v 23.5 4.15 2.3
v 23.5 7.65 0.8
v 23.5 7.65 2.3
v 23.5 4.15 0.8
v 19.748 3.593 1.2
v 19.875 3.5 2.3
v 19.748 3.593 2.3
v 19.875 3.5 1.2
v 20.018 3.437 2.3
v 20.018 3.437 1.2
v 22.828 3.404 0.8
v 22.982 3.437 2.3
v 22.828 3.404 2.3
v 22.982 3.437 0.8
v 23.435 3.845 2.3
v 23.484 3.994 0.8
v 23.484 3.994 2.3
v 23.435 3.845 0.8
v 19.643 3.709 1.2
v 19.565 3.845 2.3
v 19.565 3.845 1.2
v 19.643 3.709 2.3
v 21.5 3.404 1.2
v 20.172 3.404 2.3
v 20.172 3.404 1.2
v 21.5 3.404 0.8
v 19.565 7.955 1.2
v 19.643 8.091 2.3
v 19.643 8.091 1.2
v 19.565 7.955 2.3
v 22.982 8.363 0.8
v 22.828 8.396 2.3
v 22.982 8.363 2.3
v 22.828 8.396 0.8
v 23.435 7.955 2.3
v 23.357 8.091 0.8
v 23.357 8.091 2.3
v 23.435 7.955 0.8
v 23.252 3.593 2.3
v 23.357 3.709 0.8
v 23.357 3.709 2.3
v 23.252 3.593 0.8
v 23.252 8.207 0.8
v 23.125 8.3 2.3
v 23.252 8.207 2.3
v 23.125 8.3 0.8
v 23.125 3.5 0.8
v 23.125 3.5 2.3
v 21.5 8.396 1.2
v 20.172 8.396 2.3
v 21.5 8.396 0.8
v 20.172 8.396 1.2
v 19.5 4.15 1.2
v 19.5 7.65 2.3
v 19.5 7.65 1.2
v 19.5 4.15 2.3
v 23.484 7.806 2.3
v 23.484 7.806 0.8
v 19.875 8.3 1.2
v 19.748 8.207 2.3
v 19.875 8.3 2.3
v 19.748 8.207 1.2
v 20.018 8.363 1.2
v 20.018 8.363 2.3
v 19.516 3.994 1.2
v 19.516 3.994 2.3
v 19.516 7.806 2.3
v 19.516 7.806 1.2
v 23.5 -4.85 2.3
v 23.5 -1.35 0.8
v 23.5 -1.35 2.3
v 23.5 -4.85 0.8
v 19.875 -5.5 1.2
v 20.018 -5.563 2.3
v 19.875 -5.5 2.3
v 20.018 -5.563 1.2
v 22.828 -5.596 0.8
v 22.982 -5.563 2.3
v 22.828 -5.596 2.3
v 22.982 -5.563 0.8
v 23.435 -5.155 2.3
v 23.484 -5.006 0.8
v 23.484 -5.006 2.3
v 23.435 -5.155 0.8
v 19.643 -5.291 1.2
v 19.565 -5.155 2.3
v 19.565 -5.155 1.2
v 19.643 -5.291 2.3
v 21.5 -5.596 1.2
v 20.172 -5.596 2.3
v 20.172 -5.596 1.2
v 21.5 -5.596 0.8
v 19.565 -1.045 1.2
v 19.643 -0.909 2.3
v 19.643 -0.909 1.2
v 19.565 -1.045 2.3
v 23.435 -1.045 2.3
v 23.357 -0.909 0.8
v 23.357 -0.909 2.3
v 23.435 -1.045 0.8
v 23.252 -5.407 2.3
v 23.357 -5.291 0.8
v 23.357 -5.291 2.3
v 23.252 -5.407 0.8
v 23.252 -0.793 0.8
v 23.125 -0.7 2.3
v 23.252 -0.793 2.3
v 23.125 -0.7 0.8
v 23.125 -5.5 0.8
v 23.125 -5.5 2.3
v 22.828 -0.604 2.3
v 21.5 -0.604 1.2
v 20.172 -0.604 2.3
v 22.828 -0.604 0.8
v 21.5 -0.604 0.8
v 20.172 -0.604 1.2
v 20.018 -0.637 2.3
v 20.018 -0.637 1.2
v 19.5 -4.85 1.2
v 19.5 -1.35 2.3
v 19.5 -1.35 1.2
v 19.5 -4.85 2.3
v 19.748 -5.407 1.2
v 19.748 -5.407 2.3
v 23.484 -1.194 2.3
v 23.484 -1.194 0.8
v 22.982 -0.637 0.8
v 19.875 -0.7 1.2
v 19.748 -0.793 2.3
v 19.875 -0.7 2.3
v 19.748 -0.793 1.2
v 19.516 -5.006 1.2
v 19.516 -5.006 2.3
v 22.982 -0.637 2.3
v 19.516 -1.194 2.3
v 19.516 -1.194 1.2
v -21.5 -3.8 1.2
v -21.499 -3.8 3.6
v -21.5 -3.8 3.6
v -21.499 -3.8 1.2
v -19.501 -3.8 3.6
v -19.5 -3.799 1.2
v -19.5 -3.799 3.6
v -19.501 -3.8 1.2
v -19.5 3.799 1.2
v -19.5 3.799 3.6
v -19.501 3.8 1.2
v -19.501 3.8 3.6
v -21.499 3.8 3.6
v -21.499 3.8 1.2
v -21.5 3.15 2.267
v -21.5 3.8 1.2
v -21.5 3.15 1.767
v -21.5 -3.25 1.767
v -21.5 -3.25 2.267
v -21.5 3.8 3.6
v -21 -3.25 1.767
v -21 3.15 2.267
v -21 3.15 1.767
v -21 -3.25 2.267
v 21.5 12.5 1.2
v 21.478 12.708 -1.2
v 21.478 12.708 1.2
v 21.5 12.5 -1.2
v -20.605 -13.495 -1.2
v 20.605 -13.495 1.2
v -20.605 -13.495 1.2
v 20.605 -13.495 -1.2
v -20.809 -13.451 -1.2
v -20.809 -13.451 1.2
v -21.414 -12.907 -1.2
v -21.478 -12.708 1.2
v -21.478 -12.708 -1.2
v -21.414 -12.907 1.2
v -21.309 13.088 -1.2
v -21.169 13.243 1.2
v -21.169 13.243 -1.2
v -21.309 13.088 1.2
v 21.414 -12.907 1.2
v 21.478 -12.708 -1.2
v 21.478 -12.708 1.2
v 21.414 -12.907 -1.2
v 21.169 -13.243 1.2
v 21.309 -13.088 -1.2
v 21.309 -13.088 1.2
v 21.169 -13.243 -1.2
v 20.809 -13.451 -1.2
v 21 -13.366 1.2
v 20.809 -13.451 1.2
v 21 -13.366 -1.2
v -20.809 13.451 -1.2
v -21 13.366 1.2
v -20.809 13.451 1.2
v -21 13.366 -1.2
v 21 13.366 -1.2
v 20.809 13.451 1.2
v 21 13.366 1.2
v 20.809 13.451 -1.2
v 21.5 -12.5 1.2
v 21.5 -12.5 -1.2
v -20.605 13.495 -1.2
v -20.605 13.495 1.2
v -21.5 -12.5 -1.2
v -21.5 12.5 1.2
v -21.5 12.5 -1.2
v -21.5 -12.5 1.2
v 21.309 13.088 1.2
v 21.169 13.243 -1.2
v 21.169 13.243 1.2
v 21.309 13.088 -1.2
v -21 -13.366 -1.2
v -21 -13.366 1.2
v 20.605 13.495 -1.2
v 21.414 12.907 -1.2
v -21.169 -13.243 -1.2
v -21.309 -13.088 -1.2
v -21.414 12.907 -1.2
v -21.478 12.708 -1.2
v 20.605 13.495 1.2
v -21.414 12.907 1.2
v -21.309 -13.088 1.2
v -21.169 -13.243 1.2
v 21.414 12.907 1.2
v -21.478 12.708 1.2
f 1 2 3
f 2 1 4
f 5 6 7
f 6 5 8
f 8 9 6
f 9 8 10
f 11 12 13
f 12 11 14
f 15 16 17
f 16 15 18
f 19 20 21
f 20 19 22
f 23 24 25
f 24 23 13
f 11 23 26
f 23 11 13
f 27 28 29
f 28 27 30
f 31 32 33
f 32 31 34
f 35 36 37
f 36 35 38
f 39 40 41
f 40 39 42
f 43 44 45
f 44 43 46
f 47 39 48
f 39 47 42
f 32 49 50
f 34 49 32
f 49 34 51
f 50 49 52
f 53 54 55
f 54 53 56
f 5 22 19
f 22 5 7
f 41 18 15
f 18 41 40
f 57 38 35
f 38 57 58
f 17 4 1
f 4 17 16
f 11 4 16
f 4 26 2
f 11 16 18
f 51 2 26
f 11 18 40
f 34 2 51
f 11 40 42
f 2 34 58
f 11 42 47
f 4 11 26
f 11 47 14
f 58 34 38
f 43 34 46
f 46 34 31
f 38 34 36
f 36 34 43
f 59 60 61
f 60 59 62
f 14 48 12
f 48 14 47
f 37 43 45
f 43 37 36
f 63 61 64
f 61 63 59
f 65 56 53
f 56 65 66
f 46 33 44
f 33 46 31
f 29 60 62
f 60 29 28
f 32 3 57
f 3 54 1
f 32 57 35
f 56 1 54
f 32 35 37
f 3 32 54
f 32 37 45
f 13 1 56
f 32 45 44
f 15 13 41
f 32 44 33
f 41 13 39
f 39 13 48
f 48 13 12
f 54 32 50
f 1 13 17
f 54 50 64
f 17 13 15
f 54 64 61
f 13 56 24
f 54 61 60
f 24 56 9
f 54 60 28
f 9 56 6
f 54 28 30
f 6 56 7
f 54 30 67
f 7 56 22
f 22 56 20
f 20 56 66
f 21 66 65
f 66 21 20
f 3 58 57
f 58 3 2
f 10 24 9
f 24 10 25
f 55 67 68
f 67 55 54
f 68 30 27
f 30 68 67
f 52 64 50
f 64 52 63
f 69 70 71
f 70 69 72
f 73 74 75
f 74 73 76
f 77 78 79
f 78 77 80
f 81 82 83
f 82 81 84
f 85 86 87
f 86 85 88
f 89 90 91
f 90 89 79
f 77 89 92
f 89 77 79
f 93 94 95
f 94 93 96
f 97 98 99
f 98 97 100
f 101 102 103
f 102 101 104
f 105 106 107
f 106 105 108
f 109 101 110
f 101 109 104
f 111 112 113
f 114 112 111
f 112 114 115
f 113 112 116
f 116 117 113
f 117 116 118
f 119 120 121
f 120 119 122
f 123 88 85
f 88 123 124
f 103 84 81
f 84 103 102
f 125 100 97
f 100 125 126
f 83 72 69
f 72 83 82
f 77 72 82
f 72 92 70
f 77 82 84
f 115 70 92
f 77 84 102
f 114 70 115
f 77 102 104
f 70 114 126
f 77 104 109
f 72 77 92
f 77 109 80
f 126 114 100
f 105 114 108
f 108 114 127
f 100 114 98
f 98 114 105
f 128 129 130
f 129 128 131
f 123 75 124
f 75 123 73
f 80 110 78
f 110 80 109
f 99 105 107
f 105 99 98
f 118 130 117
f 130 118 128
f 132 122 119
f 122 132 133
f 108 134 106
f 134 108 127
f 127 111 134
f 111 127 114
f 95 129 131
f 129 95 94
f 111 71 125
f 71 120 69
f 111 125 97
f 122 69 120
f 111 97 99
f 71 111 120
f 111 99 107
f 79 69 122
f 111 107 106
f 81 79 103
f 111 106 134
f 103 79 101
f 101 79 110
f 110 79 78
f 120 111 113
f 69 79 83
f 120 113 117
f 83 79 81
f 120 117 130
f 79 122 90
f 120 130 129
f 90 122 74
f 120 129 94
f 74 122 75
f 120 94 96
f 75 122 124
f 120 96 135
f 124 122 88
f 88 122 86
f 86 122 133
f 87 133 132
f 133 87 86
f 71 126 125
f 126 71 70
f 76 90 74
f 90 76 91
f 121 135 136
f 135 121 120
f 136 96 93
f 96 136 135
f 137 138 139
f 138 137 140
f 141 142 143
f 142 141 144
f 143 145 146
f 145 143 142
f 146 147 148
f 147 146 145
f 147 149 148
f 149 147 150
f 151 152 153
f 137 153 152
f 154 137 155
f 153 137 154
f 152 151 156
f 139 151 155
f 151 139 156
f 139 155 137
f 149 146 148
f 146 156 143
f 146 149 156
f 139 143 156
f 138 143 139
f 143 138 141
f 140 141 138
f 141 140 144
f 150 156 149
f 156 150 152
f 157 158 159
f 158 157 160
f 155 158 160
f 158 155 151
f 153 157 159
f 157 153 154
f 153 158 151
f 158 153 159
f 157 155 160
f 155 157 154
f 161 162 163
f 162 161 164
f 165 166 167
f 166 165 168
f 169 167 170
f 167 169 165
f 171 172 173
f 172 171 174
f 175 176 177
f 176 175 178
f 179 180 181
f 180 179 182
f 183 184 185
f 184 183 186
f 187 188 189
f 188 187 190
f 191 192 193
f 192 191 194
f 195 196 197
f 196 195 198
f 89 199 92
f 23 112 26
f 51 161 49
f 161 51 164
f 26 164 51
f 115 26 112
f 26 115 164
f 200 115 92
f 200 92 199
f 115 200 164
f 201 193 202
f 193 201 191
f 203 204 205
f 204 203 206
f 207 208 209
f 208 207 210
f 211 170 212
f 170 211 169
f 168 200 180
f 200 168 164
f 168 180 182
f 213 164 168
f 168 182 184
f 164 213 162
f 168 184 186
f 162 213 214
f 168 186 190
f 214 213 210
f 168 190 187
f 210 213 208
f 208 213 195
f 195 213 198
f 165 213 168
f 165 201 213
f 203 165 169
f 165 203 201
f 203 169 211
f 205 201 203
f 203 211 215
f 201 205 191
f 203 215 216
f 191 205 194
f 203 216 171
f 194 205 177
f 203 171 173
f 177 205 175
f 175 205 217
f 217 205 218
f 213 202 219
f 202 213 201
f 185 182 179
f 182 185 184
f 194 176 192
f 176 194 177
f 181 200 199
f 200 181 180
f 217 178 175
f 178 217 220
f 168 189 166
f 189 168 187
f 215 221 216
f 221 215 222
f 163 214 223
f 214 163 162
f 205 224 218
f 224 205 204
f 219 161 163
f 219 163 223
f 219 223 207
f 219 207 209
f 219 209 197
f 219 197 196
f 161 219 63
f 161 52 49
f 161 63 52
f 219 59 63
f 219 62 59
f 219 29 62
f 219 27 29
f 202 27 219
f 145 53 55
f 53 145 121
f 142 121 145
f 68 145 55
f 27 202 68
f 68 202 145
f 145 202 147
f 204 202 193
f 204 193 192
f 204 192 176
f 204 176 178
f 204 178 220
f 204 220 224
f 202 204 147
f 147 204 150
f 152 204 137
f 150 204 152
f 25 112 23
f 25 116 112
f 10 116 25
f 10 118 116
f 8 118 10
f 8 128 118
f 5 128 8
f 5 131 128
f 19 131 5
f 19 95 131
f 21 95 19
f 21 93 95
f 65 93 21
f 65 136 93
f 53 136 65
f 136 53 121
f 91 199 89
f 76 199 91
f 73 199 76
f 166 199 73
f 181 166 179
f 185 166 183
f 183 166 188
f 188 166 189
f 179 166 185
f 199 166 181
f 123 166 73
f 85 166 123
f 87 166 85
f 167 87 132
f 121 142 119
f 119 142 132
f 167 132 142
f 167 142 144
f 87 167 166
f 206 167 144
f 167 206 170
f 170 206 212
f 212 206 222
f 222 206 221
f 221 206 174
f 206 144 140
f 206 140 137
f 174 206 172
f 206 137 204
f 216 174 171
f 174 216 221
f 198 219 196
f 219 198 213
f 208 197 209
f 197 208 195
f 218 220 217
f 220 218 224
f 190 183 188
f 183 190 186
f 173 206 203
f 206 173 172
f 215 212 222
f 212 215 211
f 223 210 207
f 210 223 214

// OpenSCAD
// file: lib/roundedcube.scad
// More information: https://danielupshaw.com/openscad-rounded-corners/

// Set to 0.01 for higher definition curves (renders slower)
$fs = 0.15;

module roundedcube(size = [1, 1, 1], center = false, radius = 0.5, apply_to = "all") {
	// If single value, convert to [x, y, z] vector
	size = (size[0] == undef) ? [size, size, size] : size;

	translate_min = radius;
	translate_xmax = size[0] - radius;
	translate_ymax = size[1] - radius;
	translate_zmax = size[2] - radius;

	diameter = radius * 2;

	obj_translate = (center == false) ?
		[0, 0, 0] : [
			-(size[0] / 2),
			-(size[1] / 2),
			-(size[2] / 2)
		];

	translate(v = obj_translate) {
		hull() {
			for (translate_x = [translate_min, translate_xmax]) {
				x_at = (translate_x == translate_min) ? "min" : "max";
				for (translate_y = [translate_min, translate_ymax]) {
					y_at = (translate_y == translate_min) ? "min" : "max";
					for (translate_z = [translate_min, translate_zmax]) {
						z_at = (translate_z == translate_min) ? "min" : "max";

						translate(v = [translate_x, translate_y, translate_z])
						if (
							(apply_to == "all") ||
							(apply_to == "xmin" && x_at == "min") || (apply_to == "xmax" && x_at == "max") ||
							(apply_to == "ymin" && y_at == "min") || (apply_to == "ymax" && y_at == "max") ||
							(apply_to == "zmin" && z_at == "min") || (apply_to == "zmax" && z_at == "max")
						) {
							sphere(r = radius);
						} else {
							rotate = 
								(apply_to == "xmin" || apply_to == "xmax" || apply_to == "x") ? [0, 90, 0] : (
								(apply_to == "ymin" || apply_to == "ymax" || apply_to == "y") ? [90, 90, 0] :
								[0, 0, 0]
							);
							rotate(a = rotate)
							cylinder(h = diameter, r = radius, center = true);
						}
					}
				}
			}
		}
	}
}
// main file
use <lib/roundedcube.scad>

w = 43;
h = 1.6;
d = 27;

knob_depth = 5;
knob_offset = 11.05 - knob_depth;

knob_w = 4;
knob_distance_from_center = 2 + knob_depth / 2;
knob_h = 1.5;
knob_roundess = 0.75;
knob_hole_max_d = 2; // knob_w - knob_protrude ei saisi olla enempää
knob_protrude = knob_w - knob_hole_max_d;

notch_w = 5.4; // kuinka iso kiinnikeliparen koko on
notch_d_from_wall = 11.75; // Kuinka iso matka kiinnitylipareesta on seinään
notch_depth = 0.5;
notch_distance_from_surface = 0.5;
notch_height = 0.5;
notch_container_height = 4;
notch_container_depth = 2;
notch_container_width = notch_w + 0.2 + 2;

// wt eli seinän paksuus 
module kalikka(x,y,z,wt) { 
    difference() {
    group() {
            color("blue") {
                roundedcube([x+wt+wt,y+wt+wt,z+wt], true, , "xy");
                }
        }
        translate([0,0,wt]) { 
            color("red") {
                #roundedcube([x,y,z],radius=0.1, center=true);
            }
        }
    }
}
// kalikka(x=12.7, y=6.7, z=2.3, wt=0.6);
roundedcube([w, d, h], true, 1, "z");
translate([w /2 - knob_w / 2 + knob_protrude, 1.4, h / 2 + knob_h / 2]) {
    translate([0, knob_distance_from_center, 0]) {
        roundedcube([knob_w, knob_depth,knob_h], true, knob_roundess, "zmax");
    }
    translate([0, -knob_distance_from_center, 0]) {
        roundedcube([knob_w, knob_depth,knob_h], true, knob_roundess, "zmax");
    }
}

// knob
translate([-w/2 + notch_container_depth/2,0, h]) {
// Main cube with a part removed
    difference() {
        roundedcube([notch_container_depth, notch_container_width,notch_container_height], true,  0.001, "");
        // Shape to subtract from the main cube
        translate([-notch_container_depth / 2, -1 * ((notch_container_width + notch_w)/ 2)/2, notch_height / 3]) {
            cube([notch_depth, notch_w + 1, notch_height]);
        }
    }
}
    
